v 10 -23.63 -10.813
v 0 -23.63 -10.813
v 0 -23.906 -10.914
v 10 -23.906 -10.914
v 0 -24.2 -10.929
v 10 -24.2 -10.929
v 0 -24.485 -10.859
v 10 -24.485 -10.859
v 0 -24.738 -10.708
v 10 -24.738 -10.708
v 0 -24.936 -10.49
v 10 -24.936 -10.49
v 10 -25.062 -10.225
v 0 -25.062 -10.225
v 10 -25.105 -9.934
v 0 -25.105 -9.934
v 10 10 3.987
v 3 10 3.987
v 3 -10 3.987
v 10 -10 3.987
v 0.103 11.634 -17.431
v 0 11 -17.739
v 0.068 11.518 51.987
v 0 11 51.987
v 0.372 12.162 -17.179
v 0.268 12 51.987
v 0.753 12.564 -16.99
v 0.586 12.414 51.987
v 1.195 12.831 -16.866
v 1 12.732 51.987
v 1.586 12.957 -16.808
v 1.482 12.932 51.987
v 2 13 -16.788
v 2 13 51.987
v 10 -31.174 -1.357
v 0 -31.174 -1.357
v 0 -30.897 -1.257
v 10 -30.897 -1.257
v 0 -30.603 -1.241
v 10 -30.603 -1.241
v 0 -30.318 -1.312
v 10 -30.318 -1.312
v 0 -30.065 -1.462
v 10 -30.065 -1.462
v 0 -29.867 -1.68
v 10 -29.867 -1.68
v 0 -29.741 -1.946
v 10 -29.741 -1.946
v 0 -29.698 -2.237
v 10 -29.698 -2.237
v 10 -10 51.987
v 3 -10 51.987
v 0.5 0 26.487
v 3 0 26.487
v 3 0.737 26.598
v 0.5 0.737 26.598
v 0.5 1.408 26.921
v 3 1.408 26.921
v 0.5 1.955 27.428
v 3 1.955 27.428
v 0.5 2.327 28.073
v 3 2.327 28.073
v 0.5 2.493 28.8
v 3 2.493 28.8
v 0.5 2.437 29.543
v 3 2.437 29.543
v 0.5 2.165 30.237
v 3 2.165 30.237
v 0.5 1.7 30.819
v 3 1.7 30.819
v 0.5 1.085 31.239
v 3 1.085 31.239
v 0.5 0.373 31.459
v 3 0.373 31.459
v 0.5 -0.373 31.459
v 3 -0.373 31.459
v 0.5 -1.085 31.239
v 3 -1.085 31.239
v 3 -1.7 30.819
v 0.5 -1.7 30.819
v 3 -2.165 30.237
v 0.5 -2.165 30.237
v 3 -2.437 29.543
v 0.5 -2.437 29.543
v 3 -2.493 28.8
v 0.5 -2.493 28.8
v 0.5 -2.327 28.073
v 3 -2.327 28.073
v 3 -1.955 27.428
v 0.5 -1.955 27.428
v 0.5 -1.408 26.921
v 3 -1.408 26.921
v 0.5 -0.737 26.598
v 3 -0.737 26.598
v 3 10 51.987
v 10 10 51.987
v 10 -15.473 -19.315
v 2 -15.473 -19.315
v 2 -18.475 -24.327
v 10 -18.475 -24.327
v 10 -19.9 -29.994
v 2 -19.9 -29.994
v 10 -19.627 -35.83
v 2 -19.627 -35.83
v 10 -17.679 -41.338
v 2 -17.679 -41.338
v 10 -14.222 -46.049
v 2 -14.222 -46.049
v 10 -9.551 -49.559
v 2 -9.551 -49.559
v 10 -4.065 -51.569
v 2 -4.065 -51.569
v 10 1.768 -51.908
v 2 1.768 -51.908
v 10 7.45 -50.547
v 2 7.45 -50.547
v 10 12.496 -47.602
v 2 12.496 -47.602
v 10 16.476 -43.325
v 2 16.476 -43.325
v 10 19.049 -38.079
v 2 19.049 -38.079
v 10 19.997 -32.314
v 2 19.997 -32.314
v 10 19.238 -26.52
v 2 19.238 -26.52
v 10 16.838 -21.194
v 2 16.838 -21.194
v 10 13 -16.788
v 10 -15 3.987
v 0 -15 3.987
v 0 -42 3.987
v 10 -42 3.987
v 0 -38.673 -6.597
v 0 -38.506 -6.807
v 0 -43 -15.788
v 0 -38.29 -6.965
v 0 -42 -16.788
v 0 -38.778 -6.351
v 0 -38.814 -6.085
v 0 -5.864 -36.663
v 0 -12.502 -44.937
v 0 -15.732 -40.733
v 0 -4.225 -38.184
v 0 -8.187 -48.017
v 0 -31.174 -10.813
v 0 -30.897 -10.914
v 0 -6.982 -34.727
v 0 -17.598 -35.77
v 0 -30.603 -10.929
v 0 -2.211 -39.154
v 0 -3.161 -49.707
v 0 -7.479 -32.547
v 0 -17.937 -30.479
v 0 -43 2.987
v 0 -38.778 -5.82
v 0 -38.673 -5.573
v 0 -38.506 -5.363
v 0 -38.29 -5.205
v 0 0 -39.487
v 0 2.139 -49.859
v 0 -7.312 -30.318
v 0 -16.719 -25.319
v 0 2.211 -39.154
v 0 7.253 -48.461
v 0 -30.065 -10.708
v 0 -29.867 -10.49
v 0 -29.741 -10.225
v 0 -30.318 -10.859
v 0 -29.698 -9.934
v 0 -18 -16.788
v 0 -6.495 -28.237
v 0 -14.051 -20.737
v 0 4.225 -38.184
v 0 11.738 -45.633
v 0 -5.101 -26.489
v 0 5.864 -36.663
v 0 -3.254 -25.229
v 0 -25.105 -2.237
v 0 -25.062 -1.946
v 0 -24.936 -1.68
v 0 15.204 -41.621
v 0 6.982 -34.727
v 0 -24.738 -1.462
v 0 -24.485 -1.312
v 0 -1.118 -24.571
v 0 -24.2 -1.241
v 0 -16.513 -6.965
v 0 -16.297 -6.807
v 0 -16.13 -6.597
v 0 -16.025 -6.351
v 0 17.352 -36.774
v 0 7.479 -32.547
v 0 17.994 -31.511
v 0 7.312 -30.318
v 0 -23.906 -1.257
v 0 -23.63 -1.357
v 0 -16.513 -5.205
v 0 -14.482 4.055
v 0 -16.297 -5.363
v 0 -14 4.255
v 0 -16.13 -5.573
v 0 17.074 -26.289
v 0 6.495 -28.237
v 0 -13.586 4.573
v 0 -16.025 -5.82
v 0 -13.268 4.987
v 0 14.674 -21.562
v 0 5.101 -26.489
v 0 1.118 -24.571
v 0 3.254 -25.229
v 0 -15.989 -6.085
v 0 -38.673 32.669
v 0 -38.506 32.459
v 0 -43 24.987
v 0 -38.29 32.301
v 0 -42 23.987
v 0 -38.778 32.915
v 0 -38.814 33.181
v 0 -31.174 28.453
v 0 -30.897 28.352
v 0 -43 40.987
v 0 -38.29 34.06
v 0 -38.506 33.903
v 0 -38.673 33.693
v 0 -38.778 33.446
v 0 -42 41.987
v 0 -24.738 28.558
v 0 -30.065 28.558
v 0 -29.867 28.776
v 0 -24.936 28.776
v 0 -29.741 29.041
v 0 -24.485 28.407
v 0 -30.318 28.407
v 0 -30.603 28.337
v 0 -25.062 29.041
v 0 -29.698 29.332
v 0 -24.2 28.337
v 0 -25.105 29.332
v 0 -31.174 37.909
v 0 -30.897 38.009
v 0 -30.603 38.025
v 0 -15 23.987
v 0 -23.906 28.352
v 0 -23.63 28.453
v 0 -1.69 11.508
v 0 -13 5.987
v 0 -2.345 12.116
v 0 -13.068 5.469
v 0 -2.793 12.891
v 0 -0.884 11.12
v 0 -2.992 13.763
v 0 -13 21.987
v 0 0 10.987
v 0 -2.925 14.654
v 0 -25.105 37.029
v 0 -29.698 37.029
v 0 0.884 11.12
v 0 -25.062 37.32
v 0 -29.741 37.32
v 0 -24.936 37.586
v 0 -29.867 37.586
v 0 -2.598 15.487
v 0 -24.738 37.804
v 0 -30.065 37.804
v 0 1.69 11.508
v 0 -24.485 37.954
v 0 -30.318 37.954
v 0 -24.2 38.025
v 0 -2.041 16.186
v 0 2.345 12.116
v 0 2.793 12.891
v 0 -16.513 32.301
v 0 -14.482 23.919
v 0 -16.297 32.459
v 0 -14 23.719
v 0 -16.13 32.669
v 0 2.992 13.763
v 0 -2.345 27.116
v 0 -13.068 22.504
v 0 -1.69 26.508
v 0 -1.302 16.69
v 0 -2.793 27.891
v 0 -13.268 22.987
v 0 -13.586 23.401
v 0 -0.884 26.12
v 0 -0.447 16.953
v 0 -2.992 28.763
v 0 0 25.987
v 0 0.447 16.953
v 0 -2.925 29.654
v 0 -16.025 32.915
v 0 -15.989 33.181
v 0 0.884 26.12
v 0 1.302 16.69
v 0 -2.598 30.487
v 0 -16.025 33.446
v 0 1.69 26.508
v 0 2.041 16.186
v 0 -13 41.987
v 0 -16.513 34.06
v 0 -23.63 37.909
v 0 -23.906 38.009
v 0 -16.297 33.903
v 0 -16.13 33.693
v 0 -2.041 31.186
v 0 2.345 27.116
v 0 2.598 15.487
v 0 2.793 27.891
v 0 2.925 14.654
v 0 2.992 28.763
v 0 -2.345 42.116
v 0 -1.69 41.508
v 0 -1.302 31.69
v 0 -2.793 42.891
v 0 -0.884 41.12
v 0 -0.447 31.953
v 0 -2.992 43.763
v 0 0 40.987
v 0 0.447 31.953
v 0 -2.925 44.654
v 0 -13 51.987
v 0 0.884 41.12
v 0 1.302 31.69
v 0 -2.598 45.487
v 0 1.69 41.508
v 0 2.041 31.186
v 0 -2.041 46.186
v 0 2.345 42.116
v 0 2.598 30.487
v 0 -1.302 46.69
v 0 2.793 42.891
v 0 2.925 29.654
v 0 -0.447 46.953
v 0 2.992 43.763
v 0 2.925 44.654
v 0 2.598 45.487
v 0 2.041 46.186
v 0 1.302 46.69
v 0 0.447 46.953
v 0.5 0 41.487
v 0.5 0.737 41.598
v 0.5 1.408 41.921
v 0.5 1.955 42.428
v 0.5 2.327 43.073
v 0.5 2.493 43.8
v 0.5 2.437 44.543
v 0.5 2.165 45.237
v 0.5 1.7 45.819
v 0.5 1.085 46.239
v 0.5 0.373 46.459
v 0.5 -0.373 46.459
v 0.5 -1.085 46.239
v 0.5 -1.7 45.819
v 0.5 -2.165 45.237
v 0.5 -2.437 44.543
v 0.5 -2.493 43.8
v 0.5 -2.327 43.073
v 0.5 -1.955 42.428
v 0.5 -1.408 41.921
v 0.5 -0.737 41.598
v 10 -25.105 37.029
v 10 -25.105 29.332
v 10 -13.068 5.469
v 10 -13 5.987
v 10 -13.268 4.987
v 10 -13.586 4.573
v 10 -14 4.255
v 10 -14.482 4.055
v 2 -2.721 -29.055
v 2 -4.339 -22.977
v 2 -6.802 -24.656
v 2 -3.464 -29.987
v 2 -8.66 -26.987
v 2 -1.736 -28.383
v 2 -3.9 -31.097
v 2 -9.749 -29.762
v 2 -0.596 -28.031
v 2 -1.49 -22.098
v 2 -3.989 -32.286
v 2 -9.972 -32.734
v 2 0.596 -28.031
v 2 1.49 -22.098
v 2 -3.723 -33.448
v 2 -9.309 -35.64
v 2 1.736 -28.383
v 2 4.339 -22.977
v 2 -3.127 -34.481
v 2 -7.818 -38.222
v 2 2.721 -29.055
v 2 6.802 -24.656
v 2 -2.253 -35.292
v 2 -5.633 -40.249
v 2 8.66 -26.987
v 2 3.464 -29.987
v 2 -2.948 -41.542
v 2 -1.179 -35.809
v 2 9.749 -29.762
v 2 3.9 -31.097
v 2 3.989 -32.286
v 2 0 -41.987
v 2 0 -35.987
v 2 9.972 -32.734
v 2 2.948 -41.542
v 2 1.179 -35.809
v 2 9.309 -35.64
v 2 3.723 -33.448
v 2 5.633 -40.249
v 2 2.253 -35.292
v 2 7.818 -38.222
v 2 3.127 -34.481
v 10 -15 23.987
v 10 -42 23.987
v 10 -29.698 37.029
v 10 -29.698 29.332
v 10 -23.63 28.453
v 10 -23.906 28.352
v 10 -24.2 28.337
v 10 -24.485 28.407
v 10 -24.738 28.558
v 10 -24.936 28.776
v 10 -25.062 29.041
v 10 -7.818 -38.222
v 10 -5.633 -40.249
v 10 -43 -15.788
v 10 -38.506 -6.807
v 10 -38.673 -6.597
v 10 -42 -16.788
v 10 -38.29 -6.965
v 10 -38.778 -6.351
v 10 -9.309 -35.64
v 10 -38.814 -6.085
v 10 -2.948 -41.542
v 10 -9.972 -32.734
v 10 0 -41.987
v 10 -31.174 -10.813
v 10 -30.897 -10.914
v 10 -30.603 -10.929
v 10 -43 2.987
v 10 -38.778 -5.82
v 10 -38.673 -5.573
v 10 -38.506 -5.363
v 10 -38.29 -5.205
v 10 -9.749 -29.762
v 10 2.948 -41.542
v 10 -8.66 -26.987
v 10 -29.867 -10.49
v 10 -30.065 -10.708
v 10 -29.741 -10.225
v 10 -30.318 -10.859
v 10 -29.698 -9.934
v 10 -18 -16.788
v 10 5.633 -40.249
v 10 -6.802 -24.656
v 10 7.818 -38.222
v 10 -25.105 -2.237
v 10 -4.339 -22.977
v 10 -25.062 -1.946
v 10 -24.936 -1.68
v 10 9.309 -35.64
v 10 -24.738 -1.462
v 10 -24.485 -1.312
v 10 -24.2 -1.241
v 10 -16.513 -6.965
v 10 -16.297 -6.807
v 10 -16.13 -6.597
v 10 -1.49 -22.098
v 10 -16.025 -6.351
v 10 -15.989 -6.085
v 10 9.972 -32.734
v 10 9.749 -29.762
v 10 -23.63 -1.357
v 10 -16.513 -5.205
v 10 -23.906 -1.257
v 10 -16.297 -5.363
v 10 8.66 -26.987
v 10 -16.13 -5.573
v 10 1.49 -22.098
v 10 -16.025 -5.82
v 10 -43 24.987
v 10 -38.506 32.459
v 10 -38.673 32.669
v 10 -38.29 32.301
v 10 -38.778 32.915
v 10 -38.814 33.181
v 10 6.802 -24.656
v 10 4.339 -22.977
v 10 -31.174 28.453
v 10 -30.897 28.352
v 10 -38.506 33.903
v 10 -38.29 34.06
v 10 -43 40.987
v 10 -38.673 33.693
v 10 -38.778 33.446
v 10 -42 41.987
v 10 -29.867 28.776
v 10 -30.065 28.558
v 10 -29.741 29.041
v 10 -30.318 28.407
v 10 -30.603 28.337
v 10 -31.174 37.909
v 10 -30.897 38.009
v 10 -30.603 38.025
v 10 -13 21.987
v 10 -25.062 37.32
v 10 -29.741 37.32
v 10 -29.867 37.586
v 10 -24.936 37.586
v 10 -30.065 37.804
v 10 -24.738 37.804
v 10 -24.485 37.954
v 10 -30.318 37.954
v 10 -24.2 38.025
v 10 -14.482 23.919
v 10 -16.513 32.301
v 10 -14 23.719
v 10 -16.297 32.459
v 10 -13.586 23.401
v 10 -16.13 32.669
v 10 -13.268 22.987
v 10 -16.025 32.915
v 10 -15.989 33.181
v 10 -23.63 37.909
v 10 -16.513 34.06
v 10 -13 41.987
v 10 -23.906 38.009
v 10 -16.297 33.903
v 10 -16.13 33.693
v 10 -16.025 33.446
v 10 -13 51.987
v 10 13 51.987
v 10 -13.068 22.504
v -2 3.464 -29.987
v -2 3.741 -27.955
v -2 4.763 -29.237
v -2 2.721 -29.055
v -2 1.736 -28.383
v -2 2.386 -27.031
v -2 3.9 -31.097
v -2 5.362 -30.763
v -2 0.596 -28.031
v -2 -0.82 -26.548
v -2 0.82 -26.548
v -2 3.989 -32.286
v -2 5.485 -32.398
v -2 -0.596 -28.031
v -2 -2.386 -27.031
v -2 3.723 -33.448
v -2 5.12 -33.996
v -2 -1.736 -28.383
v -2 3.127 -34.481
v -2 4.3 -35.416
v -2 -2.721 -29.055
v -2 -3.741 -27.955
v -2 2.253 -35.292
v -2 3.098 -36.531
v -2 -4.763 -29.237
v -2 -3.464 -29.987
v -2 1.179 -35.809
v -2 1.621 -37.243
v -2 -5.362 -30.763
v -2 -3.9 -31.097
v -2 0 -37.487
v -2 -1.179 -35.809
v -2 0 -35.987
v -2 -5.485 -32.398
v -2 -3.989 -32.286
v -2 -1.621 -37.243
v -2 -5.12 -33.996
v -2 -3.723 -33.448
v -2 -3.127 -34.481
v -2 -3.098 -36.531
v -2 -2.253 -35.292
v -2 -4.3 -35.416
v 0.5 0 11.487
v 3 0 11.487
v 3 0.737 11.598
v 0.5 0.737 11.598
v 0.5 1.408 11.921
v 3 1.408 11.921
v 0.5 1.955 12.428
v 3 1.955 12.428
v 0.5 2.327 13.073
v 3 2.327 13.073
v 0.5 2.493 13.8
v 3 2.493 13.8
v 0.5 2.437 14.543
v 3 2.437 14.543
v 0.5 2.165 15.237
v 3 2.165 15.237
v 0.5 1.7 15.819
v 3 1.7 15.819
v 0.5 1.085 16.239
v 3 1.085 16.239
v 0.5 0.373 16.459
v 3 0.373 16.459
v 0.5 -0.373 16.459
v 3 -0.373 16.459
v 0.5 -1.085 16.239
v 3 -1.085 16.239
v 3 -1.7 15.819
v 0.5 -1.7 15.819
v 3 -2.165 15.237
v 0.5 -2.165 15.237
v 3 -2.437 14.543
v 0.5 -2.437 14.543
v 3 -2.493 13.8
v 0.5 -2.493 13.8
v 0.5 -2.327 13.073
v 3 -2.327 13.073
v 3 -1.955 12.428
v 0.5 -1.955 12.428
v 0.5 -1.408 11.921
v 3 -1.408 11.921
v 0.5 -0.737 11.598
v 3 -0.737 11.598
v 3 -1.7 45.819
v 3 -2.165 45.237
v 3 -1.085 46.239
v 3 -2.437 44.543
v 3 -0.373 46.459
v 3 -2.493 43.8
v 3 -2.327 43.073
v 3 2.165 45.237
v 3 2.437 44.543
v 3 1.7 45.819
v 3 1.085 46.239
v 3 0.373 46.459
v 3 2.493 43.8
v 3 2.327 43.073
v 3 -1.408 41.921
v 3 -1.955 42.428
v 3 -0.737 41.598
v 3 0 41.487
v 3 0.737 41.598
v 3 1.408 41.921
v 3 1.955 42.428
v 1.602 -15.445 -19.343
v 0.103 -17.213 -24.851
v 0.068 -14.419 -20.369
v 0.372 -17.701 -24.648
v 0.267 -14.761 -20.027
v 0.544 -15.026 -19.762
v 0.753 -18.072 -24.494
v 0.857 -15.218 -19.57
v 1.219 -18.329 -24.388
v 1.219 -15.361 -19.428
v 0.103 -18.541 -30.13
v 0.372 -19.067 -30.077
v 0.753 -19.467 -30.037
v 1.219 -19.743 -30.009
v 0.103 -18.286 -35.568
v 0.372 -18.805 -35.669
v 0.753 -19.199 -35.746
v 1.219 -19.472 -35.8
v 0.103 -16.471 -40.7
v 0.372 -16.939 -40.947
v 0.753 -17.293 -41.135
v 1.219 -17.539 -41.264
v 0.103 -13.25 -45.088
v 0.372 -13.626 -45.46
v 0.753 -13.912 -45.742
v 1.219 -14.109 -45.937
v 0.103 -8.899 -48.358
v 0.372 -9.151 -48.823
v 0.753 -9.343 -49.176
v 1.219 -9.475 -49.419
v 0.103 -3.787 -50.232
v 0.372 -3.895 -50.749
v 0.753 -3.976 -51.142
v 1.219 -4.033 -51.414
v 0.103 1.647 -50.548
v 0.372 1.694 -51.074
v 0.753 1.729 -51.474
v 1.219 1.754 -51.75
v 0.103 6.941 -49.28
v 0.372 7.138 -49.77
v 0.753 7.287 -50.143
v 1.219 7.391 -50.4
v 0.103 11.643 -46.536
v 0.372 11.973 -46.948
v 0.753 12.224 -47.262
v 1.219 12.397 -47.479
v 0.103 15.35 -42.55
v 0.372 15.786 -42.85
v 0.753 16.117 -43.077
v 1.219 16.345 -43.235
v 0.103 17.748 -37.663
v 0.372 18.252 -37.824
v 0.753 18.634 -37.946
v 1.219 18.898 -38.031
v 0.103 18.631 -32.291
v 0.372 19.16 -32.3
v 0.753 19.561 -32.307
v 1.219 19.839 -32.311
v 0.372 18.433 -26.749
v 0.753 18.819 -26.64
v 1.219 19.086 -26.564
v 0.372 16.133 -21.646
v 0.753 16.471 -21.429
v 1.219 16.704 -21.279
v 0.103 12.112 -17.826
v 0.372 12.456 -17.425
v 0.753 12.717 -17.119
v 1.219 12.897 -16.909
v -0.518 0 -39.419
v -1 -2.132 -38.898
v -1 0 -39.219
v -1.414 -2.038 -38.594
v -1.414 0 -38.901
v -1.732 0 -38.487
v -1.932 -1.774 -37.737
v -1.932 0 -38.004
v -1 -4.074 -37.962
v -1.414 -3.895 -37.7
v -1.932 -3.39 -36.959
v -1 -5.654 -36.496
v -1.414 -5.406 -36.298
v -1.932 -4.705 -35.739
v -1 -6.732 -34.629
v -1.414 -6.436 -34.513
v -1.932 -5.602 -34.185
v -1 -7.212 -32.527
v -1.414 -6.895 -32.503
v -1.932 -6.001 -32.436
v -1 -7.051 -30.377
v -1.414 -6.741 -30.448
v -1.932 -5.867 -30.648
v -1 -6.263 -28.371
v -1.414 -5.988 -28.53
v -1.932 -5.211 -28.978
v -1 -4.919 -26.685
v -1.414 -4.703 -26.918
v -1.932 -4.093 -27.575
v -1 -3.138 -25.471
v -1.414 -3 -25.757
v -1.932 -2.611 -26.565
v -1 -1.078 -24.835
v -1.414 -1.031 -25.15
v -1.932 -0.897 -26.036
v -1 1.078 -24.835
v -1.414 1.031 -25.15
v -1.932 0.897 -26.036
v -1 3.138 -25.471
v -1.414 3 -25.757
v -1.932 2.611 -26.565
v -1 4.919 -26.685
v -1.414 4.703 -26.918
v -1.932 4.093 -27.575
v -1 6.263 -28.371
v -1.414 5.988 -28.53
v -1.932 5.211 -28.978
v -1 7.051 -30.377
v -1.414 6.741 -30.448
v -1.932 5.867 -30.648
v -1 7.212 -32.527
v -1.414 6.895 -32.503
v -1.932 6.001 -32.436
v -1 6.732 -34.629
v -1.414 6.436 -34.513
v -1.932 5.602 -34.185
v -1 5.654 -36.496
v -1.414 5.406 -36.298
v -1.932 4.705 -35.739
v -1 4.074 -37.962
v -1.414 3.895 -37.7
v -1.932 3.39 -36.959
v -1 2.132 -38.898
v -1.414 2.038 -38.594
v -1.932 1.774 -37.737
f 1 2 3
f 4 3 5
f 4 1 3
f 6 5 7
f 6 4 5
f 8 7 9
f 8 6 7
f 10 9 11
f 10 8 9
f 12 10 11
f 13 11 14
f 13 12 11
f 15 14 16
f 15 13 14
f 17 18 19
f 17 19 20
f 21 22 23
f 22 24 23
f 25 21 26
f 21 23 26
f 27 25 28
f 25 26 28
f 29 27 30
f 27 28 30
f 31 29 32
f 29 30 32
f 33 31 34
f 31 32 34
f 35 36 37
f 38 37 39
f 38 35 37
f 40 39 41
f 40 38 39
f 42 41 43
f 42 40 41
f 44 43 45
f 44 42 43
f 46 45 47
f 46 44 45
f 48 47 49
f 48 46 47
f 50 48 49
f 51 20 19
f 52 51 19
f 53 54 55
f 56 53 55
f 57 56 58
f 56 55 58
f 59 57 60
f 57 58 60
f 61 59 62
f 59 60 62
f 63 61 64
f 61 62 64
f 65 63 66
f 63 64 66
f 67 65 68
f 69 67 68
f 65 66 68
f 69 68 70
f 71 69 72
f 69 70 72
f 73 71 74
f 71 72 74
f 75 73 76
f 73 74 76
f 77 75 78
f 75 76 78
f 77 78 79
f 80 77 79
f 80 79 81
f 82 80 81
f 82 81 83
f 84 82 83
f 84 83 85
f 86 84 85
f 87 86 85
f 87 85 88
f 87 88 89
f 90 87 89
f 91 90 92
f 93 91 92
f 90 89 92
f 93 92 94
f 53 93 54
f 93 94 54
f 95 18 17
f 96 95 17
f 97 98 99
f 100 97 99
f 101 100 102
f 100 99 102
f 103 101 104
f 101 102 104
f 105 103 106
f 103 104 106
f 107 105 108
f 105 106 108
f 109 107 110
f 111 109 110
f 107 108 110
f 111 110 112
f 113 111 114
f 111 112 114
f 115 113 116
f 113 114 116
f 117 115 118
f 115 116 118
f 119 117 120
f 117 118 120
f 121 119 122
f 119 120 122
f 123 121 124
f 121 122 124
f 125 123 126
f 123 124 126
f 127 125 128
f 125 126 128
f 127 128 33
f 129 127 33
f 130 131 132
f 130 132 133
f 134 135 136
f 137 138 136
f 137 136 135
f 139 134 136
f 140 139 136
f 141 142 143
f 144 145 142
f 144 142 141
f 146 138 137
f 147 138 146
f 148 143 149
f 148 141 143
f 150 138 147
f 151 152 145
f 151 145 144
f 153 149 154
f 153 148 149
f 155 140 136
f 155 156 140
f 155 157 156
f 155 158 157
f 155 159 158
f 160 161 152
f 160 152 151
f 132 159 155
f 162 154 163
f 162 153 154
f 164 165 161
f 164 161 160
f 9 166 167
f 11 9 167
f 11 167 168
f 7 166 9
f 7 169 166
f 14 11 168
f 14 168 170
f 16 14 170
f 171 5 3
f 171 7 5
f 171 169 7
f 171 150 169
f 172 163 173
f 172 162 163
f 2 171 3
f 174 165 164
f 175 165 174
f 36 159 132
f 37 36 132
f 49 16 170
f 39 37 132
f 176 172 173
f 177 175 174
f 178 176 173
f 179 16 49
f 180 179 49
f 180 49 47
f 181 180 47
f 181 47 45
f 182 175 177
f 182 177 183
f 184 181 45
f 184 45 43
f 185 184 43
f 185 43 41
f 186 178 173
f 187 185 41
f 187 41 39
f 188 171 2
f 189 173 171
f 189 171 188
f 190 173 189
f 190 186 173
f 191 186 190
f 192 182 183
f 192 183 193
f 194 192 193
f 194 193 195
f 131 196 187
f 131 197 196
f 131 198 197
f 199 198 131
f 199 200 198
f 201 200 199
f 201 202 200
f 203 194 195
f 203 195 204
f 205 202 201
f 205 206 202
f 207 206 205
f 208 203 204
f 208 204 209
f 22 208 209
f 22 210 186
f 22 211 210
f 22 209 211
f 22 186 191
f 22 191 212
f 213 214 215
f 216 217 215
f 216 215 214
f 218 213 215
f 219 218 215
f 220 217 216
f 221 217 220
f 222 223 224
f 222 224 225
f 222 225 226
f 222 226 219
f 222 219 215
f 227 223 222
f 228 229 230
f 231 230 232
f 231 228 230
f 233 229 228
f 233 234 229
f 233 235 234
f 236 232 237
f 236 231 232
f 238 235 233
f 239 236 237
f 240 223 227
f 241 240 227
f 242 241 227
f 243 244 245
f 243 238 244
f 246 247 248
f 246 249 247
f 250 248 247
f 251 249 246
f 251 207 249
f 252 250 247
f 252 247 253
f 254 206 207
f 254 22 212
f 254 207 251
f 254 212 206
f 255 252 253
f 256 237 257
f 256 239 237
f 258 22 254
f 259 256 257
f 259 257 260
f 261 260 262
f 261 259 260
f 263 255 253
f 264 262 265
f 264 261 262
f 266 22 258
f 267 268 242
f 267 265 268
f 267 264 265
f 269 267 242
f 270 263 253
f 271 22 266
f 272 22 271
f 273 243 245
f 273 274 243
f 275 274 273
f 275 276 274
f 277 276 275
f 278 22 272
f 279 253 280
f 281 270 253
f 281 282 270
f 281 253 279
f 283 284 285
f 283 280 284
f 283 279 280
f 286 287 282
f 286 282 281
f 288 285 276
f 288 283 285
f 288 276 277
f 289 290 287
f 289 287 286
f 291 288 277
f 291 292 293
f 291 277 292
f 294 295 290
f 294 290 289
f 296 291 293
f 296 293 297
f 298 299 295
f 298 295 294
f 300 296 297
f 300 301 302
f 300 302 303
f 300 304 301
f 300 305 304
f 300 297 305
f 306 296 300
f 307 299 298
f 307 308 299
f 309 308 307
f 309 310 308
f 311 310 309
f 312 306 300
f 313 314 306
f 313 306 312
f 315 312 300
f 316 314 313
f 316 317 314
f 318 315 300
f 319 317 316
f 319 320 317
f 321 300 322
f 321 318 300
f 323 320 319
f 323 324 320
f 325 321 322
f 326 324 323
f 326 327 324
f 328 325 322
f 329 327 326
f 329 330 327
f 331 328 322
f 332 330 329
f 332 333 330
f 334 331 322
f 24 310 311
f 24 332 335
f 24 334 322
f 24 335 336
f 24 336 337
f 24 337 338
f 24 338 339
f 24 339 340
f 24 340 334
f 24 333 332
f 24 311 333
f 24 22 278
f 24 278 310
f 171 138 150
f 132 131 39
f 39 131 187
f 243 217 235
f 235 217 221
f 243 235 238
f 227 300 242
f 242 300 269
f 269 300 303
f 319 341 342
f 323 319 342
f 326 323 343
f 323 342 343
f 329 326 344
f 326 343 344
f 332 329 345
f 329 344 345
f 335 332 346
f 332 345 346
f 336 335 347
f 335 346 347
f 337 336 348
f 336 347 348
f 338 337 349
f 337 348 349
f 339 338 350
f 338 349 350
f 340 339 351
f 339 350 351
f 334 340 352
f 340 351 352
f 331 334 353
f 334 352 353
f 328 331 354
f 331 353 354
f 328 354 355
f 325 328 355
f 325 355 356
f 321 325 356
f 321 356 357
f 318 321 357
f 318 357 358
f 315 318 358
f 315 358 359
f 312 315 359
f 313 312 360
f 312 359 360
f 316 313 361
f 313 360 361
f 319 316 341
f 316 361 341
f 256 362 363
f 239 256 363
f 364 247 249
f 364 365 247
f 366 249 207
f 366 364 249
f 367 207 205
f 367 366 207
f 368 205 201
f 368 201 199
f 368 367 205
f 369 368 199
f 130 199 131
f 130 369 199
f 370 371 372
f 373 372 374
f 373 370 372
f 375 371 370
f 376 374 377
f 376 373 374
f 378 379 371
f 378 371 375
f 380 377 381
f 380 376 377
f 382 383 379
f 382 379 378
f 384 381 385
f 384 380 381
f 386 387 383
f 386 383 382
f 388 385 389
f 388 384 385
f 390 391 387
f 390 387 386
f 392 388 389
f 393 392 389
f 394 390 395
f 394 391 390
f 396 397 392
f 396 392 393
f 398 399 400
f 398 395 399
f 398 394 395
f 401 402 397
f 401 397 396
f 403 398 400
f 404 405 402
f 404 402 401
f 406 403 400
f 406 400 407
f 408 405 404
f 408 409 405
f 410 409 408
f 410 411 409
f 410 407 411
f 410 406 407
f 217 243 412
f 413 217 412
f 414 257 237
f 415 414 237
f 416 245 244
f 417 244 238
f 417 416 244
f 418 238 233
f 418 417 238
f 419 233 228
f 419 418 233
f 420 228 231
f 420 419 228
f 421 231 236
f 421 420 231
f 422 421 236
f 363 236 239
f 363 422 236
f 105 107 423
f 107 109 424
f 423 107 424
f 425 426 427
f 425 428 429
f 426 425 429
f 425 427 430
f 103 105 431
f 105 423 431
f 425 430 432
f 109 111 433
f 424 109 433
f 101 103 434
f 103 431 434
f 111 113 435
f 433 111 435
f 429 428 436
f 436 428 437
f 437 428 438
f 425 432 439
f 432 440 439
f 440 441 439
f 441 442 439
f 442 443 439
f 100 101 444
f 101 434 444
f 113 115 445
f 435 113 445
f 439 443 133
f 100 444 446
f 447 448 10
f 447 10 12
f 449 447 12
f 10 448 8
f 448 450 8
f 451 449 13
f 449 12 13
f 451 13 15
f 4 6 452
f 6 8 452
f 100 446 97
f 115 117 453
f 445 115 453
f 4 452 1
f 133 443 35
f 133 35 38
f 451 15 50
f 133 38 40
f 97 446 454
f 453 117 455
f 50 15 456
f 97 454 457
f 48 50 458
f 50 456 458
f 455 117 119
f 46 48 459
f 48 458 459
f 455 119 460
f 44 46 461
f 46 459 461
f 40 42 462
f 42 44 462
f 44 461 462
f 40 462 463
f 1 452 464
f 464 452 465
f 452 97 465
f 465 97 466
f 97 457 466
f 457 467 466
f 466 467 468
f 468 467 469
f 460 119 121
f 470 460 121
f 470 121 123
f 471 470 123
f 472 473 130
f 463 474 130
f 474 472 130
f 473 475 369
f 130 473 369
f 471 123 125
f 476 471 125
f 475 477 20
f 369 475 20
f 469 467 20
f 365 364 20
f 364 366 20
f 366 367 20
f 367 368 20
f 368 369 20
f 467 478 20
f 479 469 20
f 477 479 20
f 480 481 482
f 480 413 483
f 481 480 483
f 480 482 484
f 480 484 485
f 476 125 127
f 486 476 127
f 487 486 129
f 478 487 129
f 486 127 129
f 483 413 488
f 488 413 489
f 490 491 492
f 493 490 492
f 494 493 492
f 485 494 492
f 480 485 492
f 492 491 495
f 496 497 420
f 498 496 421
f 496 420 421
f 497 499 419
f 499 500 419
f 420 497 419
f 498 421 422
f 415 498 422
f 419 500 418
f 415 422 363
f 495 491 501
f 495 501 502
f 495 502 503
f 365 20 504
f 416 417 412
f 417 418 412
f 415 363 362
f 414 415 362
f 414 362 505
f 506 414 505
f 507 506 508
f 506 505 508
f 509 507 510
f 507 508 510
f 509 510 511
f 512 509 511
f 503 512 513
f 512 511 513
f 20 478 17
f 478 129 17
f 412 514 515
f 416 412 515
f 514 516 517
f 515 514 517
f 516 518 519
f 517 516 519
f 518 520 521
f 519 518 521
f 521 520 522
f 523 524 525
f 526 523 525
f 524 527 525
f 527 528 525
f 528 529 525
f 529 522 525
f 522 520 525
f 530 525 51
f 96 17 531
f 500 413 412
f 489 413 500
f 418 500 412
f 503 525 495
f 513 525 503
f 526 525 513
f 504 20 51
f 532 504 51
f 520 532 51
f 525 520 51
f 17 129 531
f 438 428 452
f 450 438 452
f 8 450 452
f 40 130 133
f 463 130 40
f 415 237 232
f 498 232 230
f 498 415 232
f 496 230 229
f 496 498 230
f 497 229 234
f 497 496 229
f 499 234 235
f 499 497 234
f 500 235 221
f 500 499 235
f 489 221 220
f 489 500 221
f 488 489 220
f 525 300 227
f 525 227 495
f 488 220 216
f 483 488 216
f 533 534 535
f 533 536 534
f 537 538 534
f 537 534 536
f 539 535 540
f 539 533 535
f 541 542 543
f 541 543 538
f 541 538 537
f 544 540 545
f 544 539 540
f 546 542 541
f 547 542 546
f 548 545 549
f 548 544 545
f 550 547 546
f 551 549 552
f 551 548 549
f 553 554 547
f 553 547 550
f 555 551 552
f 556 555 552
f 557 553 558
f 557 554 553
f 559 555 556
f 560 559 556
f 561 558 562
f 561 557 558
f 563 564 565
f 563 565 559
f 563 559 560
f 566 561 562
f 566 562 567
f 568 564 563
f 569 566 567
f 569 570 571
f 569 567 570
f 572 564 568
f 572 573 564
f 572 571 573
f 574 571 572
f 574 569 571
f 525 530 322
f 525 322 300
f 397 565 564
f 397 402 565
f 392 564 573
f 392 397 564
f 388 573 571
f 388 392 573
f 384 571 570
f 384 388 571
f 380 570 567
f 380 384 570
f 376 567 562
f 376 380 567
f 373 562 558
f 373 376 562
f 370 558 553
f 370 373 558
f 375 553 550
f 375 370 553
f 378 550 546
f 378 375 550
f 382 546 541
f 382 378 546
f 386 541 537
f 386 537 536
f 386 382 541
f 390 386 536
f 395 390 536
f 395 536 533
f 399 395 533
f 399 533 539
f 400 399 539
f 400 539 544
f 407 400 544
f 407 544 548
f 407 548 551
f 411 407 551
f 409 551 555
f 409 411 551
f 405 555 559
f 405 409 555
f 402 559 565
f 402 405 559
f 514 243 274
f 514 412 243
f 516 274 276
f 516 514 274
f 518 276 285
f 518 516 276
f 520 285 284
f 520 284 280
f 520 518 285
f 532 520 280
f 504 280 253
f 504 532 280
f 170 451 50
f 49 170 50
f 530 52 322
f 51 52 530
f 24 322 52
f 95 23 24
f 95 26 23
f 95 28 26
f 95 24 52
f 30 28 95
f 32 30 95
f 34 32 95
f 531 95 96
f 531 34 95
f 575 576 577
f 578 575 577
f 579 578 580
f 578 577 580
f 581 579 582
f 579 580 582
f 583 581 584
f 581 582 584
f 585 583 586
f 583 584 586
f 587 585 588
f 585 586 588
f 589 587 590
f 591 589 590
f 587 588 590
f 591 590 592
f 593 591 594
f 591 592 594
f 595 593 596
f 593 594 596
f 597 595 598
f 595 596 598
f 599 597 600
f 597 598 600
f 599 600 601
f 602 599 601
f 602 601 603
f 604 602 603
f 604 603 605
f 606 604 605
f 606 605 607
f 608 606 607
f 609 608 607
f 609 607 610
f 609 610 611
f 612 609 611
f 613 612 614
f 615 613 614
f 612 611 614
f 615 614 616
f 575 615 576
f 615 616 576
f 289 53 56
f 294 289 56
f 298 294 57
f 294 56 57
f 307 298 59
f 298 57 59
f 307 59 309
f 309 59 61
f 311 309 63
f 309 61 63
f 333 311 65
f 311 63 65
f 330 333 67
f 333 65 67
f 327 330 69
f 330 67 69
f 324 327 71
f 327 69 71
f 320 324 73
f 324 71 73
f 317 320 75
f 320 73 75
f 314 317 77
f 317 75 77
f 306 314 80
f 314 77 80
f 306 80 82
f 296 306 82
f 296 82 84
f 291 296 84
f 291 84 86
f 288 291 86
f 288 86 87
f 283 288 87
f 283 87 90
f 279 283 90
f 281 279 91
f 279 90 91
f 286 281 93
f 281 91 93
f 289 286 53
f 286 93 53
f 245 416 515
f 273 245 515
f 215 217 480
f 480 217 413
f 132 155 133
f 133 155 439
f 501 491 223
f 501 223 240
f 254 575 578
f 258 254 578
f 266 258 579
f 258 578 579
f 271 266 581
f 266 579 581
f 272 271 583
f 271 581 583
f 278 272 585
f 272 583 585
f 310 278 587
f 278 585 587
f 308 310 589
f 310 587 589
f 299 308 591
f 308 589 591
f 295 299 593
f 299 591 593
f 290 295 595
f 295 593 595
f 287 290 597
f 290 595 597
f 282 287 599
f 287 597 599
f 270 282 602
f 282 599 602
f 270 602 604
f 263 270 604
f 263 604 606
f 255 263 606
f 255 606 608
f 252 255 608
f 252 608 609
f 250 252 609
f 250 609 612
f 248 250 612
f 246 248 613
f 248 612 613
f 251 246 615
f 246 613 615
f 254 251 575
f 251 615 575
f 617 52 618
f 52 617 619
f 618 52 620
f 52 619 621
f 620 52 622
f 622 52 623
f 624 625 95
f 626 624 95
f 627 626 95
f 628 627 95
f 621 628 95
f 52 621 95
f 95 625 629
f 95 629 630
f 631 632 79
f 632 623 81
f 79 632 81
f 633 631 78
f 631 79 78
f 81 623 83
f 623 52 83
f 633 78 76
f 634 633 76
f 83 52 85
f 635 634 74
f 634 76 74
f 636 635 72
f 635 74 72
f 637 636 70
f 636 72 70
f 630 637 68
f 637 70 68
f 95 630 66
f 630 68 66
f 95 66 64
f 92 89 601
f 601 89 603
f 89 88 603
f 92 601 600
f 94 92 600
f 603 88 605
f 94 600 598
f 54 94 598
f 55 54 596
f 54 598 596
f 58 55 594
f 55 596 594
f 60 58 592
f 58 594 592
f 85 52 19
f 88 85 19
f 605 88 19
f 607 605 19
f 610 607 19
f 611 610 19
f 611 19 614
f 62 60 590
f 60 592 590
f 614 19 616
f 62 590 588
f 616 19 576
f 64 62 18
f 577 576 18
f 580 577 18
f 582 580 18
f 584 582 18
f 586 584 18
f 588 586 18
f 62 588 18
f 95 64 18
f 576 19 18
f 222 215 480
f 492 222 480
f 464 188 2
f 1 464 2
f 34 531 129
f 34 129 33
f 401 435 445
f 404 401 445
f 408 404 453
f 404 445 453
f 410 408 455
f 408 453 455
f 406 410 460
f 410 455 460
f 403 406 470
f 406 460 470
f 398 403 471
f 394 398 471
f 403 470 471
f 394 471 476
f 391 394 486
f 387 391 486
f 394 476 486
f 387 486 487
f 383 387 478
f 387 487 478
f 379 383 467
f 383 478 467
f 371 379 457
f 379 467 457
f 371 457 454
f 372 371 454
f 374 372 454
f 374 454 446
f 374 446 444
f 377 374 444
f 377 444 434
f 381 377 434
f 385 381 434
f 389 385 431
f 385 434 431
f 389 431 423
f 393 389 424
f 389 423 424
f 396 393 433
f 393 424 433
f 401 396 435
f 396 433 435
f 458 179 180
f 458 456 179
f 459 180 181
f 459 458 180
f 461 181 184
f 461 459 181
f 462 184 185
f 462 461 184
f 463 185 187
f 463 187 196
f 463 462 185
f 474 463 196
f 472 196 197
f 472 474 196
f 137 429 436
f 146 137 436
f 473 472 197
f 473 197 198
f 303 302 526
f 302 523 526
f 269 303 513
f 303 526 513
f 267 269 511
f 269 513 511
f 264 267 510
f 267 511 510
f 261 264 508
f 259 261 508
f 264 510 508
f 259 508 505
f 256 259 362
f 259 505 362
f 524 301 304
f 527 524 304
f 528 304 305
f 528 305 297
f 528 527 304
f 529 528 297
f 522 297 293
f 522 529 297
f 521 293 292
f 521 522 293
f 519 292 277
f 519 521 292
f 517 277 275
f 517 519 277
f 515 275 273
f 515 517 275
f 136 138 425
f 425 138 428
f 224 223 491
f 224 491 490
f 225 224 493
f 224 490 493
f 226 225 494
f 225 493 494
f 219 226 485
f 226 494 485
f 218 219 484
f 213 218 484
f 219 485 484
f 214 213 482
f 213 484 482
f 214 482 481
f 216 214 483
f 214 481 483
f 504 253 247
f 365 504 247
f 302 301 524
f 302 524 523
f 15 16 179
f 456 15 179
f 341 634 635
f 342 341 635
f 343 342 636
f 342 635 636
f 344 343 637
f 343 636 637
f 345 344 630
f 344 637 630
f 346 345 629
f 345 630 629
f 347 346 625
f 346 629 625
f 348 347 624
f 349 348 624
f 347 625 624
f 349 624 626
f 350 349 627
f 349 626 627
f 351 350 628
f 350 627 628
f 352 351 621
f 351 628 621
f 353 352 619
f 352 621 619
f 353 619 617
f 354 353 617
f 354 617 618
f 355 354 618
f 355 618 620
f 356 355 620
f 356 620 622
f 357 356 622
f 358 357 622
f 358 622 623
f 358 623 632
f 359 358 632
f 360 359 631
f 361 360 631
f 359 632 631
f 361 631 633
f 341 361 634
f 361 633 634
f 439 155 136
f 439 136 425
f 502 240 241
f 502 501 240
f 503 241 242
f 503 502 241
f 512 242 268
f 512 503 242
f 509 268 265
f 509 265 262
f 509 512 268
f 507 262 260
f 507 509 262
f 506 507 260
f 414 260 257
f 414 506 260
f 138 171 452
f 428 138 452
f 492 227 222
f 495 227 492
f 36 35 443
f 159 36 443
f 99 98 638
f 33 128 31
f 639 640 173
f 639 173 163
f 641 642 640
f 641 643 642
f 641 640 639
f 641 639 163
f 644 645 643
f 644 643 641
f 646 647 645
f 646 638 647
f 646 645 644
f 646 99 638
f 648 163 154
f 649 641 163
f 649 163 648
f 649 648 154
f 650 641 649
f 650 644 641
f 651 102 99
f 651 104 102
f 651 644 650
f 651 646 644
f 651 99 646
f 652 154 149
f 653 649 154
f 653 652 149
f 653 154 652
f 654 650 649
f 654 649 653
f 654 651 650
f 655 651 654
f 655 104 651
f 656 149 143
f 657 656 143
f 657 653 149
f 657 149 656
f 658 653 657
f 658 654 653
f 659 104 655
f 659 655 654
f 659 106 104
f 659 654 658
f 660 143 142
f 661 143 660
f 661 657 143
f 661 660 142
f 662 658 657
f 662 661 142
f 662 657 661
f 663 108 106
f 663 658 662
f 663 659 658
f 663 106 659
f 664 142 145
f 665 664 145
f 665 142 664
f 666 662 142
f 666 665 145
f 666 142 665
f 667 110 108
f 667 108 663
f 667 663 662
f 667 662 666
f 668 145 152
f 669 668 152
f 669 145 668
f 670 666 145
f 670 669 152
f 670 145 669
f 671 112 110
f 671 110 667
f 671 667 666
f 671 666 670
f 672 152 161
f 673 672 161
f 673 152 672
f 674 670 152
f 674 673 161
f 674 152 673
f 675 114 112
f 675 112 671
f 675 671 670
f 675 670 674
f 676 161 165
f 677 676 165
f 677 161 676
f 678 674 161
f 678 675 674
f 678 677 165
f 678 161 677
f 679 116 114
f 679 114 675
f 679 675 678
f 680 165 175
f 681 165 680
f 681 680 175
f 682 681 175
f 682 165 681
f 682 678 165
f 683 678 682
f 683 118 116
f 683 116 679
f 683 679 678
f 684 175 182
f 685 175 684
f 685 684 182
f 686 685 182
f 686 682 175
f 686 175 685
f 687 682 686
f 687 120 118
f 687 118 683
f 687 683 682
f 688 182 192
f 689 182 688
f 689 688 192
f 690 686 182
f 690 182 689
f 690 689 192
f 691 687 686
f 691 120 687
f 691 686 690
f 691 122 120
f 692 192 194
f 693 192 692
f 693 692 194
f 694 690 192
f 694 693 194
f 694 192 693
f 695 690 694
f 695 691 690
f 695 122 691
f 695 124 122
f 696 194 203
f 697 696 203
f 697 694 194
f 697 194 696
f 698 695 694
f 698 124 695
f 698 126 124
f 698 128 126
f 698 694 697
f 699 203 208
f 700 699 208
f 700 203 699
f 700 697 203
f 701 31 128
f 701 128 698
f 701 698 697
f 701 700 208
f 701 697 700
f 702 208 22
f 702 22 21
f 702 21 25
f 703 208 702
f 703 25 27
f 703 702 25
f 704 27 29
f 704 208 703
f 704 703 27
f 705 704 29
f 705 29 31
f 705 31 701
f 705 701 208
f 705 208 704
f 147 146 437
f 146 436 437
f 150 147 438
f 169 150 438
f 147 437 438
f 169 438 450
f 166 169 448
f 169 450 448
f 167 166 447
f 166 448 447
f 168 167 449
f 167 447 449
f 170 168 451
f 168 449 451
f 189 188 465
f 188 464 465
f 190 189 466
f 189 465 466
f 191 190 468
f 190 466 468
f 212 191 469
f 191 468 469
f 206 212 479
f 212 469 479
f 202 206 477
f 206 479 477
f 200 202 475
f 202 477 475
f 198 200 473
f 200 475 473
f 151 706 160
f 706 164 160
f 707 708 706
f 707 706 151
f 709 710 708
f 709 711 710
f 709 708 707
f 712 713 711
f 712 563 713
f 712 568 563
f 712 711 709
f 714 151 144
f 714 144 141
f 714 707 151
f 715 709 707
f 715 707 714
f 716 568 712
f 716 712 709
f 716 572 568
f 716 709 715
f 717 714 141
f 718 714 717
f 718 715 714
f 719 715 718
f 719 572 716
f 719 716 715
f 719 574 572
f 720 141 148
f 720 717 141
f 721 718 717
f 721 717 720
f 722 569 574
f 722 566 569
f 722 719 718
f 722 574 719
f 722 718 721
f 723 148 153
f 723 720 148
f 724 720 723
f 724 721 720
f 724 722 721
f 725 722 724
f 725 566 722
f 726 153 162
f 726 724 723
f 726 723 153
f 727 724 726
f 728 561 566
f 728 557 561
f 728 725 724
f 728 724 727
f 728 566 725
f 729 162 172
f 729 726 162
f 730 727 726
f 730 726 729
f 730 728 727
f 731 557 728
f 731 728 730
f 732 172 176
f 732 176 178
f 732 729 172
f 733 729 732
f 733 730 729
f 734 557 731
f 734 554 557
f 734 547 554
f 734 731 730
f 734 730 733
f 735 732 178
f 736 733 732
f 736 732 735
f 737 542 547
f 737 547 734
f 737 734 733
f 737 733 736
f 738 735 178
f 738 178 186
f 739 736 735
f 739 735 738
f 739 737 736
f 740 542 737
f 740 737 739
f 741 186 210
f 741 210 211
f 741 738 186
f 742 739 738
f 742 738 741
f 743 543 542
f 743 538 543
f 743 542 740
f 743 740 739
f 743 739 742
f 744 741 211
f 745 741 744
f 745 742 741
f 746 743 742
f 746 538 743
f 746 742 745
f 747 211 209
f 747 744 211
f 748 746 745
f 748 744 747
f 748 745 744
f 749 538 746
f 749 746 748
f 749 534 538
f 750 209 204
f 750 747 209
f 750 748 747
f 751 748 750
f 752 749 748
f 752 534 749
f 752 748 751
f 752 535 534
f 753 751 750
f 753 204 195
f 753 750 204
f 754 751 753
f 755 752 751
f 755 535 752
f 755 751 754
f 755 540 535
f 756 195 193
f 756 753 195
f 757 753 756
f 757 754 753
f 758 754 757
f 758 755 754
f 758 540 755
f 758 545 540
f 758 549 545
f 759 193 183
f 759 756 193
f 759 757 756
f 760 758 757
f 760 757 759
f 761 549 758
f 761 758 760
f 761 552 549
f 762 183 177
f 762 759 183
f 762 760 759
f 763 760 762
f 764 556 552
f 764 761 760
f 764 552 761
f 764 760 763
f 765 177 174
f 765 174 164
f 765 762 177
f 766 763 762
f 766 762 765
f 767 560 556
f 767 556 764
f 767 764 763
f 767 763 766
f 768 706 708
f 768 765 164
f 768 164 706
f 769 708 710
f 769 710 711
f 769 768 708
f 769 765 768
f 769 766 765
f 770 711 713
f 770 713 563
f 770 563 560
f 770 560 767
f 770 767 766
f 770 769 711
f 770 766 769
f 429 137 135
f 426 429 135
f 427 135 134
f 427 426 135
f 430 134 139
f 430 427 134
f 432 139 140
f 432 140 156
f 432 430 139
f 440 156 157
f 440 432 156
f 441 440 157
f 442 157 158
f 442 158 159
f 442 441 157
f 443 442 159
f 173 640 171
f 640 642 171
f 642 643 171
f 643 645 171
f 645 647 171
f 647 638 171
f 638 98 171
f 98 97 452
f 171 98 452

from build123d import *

# Parameters (mm, degrees)
SKETCH_1_R          = 20
SKETCH_1_W          = 63.973509934
SKETCH_1_H          = 26
EXTRUDE_1_DEPTH     = 10
SKETCH_2_W          = 45
SKETCH_2_H          = 20
CUT_EXTRUDE_1_DEPTH = 7
SKETCH_3_R          = 10
CUT_EXTRUDE_2_DEPTH = 8
SKETCH_4_R          = 4
CUT_EXTRUDE_3_DEPTH = 7
SKETCH_6_W          = 10
SKETCH_6_H          = 8
EXTRUDE_2_DEPTH     = 15
CHAMFER_2_SIZE      = 5
EXTRUDE_3_DEPTH     = 20
SKETCH_8_W          = 10
SKETCH_8_H          = 12.77482578
EXTRUDE_4_DEPTH     = 15
SKETCH_9_W          = 7
SKETCH_9_H          = 20
EXTRUDE_5_DEPTH     = 10
SKETCH_10_W         = 7
SKETCH_10_H         = 20
EXTRUDE_6_DEPTH     = 7
SKETCH_11_W         = 10
SKETCH_11_H         = 15
CUT_EXTRUDE_5_DEPTH = 60.88841868
SKETCH_12_W         = 10
SKETCH_12_H         = 18
SKETCH_12_H_2       = 20.77482578
EXTRUDE_7_DEPTH     = 15
CUT_EXTRUDE_6_DEPTH = 15
FILLET_1_R          = 1
CHAMFER_3_SIZE      = 1
FILLET_2_R          = 2
SKETCH_14_R         = 7.5
SKETCH_14_R_2       = 4
EXTRUDE_8_DEPTH     = 2
FILLET_3_R          = 2
SKETCH_16_R         = 2.5
CUT_EXTRUDE_7_DEPTH = 3
CHAMFER_4_SIZE      = 0.5
FILLET_4_R          = 2


# Some blends are built 0.0001 mm under size
with BuildPart() as part:
    # 草图1 → 凸台-拉伸1 (new body)
    with BuildSketch(Plane(origin=(0, 0, 0), x_dir=(0, 0, -1), z_dir=(1, 0, 0))):
        with Locations((31.986754967, 0)):
            Circle(SKETCH_1_R)
        Rectangle(SKETCH_1_W, SKETCH_1_H)
    extrude(amount=EXTRUDE_1_DEPTH)

    # 草图2 → 切除-拉伸1 (cut)
    with BuildSketch(Plane(origin=(10, 0, 0), x_dir=(0, 0, -1), z_dir=(1, 0, 0))):
        with Locations((-9.486754967, 0)):
            Rectangle(SKETCH_2_W, SKETCH_2_H)
    extrude(amount=-CUT_EXTRUDE_1_DEPTH, mode=Mode.SUBTRACT)

    # 草图3 → 切除-拉伸2 (cut)
    with BuildSketch(Plane(origin=(10, 0, 0), x_dir=(0, 0, -1), z_dir=(1, 0, 0))):
        with Locations((31.986754967, 0)):
            Circle(SKETCH_3_R)
    extrude(amount=-CUT_EXTRUDE_2_DEPTH, mode=Mode.SUBTRACT)

    # 草图4 → 切除-拉伸3 (cut)
    with BuildSketch(Plane(origin=(2, 0, 0), x_dir=(0, 0, -1), z_dir=(1, 0, 0))):
        with Locations((31.986754967, 0)):
            Circle(SKETCH_4_R)
    extrude(amount=-CUT_EXTRUDE_3_DEPTH, mode=Mode.SUBTRACT)

    # 草图6 → 凸台-拉伸2 (add)
    with BuildSketch(Plane.XZ.offset(13)):
        with Locations((5, -12.788070813)):
            Rectangle(SKETCH_6_W, SKETCH_6_H)
        with Locations((5, 27.986754967)):
            Rectangle(SKETCH_6_W, SKETCH_6_H)
    extrude(amount=EXTRUDE_2_DEPTH)

    # 倒角2
    # the kernel refuses this chamfer: 5, 3.546264764 mm, written as the material it adds along each edge
    with BuildSketch(Plane(origin=(10, -13, -16.788070813), x_dir=(0, -0.6995038411281902, -0.7146288381019251), z_dir=(-1, 0, 0))) as chamfer_2_piece_1:
        with BuildLine():
            Line((3.535736125, 0), (CHAMFER_2_SIZE * 0.699503841128, CHAMFER_2_SIZE * 0.714628838102))
            Line((CHAMFER_2_SIZE * 0.699503841128, CHAMFER_2_SIZE * 0.714628838102), (0, 0))
            ThreePointArc((0, 0), (1.768947181, 0.07828713), (3.535736125, 0))
        make_face()
    extrude(amount=10)

    # 草图7 → 凸台-拉伸3 (add)
    with BuildSketch(Plane.XY.offset(31.986754967)):
        Polygon((3, -10), (3, 10), (10, 10), (10, 13), (0, 13), (0, -28), (10, -28), (10, -10), align=None)
    extrude(amount=EXTRUDE_3_DEPTH)

    # 草图8 → 凸台-拉伸4 (add)
    with BuildSketch(Plane.XZ.offset(13)):
        with Locations((5, -2.400657923)):
            Rectangle(SKETCH_8_W, SKETCH_8_H)
    extrude(amount=EXTRUDE_4_DEPTH)

    # 草图9 → 凸台-拉伸5 (add)
    with BuildSketch(Plane.XY.offset(-13.013245033)):
        with Locations((6.5, 0)):
            Rectangle(SKETCH_9_W, SKETCH_9_H)
    extrude(amount=EXTRUDE_5_DEPTH)

    # 草图10 → 凸台-拉伸6 (add)
    with BuildSketch(Plane.XY.offset(-3.013245033)):
        with Locations((6.5, 0)):
            Rectangle(SKETCH_10_W, SKETCH_10_H)
    extrude(amount=EXTRUDE_6_DEPTH)

    # 草图11 → 切除-拉伸5 (cut, through all)
    with BuildSketch(Plane(origin=(10, 0, 0), x_dir=(0, 0, -1), z_dir=(1, 0, 0))):
        with Locations((-46.986754967, -20.5)):
            Rectangle(SKETCH_11_W, SKETCH_11_H)
    extrude(amount=-CUT_EXTRUDE_5_DEPTH, mode=Mode.SUBTRACT)

    # 草图12 → 凸台-拉伸7 (add)
    with BuildSketch(Plane.XZ.offset(28)):
        with Locations((5, 32.986754967)):
            Rectangle(SKETCH_12_W, SKETCH_12_H)
        with Locations((5, -6.400657923)):
            Rectangle(SKETCH_12_W, SKETCH_12_H_2)
    extrude(amount=EXTRUDE_7_DEPTH)

    # 草图13 → 切除-拉伸6 (cut)
    with BuildSketch(Plane.ZY):
        Polygon((-11.611311333, -29.697810406), (-0.558833166, -29.697810406), (-6.085072249, -39.916139278), align=None)
        Polygon((-6.085072249, -14.886974177), (-11.611311333, -25.105303048), (-0.558833166, -25.105303048), align=None)
        Polygon((38.707104745, -25.105303048), (27.654626578, -25.105303048), (33.180865662, -14.886974177), align=None)
        Polygon((33.180865662, -39.916139278), (38.707104745, -29.697810406), (27.654626578, -29.697810406), align=None)
    extrude(amount=-CUT_EXTRUDE_6_DEPTH, mode=Mode.SUBTRACT)

    # 圆角1
    fillet_1_edges = [part.edges().sort_by_distance(p)[0] for p in [
        (5, -39.916139278, 33.180865662),
        (5, -29.697810406, 27.654626578),
        (5, -29.697810406, 38.707104745),
        (5, -14.886974177, 33.180865662),
        (5, -25.105303048, 38.707104745),
        (5, -25.105303048, 27.654626578),
        (5, -14.886974177, -6.085072249),
        (5, -25.105303048, -0.558833166),
        (5, -25.105303048, -11.611311333),
        (5, -39.916139278, -6.085072249),
        (5, -29.697810406, -11.611311333),
        (5, -29.697810406, -0.558833166),
    ]]
    fillet(fillet_1_edges, radius=FILLET_1_R)

    # 倒角3
    chamfer_3_edges = [part.edges().sort_by_distance(p)[0] for p in [
        (5, -43, 41.986754967),
        (5, -43, 23.986754967),
        (5, -43, 3.986754967),
        (5, -43, -16.788070813),
    ]]
    chamfer(chamfer_3_edges, length=CHAMFER_3_SIZE)

    # 圆角2
    fillet_2_edges = [part.edges().sort_by_distance(p)[0] for p in [
        (5, -13, 3.986754967),
        (5, -13, 23.986754967),
    ]]
    fillet(fillet_2_edges, radius=FILLET_2_R)

    # 草图14 → 凸台-拉伸8 (add)
    with BuildSketch(Plane.ZY):
        with Locations(Location((-31.986754967, 0, 0), (0, 0, 180))):
            Circle(SKETCH_14_R)
        with Locations(Location((-31.986754967, 0, 0), (0, 0, 180))):
            Circle(SKETCH_14_R_2, mode=Mode.SUBTRACT)
    extrude(amount=EXTRUDE_8_DEPTH)

    # 圆角3
    fillet_3_edges = [part.edges().sort_by_distance(p)[0] for p in [
        (-2, 0, -24.486754967),
    ]]
    fillet(fillet_3_edges, radius=FILLET_3_R - 0.0001)  # a hair under: the kernel refuses the full size

    # 草图16 → 切除-拉伸7 (cut)
    with BuildSketch(Plane(origin=(3, 0, 0), x_dir=(0, 0, -1), z_dir=(1, 0, 0))):
        with Locations((-43.986754967, 0)):
            Circle(SKETCH_16_R)
        with Locations((-28.986754967, 0)):
            Circle(SKETCH_16_R)
        with Locations((-13.986754967, 0)):
            Circle(SKETCH_16_R)
    extrude(amount=-CUT_EXTRUDE_7_DEPTH, mode=Mode.SUBTRACT)

    # 倒角4
    chamfer_4_edges = [part.edges().sort_by_distance(p)[0] for p in [
        (0, 0, 46.486754967),
        (0, 0, 31.486754967),
        (0, 0, 16.486754967),
    ]]
    chamfer(chamfer_4_edges, length=CHAMFER_4_SIZE)

    # 圆角4
    fillet_4_edges = [part.edges().sort_by_distance(p)[0] for p in [
        (0, 13, 17.599342077),
        (0, 1.767868063, -51.908467808),
    ]]
    fillet(fillet_4_edges, radius=FILLET_4_R)


solid = part.part
